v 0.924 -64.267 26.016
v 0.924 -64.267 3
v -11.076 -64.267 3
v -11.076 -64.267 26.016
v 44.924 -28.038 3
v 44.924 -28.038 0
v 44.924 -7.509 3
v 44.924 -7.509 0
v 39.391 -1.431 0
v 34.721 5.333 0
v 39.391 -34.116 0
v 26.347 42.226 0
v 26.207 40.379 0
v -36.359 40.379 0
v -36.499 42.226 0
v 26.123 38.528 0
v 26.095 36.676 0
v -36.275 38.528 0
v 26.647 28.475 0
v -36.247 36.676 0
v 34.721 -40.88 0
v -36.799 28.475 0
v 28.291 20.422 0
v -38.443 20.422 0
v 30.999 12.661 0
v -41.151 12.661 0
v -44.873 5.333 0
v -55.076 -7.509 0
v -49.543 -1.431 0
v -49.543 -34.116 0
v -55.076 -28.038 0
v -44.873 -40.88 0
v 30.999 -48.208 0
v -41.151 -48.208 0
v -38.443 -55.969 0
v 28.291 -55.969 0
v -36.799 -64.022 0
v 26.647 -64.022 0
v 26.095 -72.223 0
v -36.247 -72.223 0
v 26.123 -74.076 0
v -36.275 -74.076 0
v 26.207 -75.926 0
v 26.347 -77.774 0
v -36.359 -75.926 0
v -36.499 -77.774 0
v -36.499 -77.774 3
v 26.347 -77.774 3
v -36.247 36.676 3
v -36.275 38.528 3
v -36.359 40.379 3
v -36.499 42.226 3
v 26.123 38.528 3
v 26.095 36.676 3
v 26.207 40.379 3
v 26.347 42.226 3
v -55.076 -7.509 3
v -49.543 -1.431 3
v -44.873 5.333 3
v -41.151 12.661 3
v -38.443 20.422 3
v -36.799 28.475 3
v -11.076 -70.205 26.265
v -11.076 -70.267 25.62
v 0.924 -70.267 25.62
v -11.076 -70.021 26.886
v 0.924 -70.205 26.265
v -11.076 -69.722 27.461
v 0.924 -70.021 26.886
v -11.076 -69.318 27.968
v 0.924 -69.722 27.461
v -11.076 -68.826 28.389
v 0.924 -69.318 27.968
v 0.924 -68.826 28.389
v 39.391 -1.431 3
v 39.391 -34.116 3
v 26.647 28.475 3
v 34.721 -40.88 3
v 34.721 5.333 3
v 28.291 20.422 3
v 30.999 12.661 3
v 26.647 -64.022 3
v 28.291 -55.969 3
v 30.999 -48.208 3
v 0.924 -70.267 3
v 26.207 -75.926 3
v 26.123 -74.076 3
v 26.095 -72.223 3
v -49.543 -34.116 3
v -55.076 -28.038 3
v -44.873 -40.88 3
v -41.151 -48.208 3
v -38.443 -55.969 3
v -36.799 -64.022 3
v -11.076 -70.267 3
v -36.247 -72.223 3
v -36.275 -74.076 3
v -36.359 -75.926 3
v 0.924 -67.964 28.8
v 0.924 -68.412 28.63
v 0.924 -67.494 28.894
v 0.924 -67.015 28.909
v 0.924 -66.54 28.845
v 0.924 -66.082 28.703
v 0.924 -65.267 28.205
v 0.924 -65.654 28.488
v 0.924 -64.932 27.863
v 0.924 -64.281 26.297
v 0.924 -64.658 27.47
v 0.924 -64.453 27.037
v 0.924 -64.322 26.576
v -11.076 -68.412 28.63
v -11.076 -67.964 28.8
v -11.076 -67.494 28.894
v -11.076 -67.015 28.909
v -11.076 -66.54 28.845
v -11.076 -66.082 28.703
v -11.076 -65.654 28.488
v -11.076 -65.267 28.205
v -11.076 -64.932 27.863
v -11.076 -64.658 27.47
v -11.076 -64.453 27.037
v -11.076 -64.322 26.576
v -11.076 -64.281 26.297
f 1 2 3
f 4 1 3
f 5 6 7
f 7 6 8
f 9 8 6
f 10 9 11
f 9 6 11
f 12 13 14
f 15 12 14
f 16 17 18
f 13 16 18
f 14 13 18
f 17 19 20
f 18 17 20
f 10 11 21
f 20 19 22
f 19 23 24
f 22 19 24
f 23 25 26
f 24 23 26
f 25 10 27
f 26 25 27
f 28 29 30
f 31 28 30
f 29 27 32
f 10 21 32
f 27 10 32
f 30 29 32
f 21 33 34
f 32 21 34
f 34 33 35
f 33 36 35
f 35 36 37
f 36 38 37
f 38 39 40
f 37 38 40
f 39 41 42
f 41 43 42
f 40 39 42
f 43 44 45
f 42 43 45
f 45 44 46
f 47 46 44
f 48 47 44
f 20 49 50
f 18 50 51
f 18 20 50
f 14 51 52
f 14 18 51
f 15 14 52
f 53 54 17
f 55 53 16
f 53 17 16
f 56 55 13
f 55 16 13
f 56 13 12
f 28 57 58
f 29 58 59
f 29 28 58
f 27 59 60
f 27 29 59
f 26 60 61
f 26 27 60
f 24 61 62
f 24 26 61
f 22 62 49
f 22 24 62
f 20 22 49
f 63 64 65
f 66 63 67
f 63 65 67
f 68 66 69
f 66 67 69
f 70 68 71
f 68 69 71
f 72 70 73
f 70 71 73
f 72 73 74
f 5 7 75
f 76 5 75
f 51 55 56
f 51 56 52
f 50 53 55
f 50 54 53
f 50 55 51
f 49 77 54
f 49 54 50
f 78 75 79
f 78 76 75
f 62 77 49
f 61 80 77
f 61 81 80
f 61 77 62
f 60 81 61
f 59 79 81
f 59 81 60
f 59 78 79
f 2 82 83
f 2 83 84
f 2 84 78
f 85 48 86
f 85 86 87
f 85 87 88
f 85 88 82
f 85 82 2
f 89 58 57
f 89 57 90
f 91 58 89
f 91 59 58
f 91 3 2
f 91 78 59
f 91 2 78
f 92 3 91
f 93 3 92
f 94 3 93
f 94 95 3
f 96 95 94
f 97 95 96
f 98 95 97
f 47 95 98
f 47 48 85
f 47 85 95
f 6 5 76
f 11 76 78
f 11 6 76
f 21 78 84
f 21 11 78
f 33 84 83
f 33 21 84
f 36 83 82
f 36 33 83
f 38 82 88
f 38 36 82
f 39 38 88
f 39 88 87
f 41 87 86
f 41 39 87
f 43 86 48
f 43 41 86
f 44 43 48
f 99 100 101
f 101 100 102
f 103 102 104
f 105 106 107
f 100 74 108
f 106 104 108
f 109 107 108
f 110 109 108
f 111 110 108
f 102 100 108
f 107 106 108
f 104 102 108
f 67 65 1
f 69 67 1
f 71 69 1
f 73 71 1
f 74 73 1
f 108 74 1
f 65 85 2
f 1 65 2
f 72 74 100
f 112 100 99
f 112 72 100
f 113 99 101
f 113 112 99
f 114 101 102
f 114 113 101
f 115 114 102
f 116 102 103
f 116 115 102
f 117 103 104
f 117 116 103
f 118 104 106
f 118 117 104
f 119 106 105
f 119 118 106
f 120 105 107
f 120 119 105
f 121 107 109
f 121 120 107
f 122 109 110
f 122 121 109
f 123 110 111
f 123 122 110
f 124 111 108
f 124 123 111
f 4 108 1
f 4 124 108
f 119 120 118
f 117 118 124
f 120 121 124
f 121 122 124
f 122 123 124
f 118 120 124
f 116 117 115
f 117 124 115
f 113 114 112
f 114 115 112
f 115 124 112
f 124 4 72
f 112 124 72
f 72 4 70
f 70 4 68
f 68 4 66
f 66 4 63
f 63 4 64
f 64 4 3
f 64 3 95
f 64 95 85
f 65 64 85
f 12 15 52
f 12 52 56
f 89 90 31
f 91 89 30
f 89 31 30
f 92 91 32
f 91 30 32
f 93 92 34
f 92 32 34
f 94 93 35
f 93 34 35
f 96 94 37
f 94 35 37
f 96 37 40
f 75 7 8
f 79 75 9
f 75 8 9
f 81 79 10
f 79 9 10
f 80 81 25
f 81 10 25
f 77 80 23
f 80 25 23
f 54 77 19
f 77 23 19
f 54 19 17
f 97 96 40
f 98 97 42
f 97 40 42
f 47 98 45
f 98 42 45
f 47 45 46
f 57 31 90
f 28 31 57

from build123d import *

# Parameters (mm, degrees)
F1_DEPTH = 3
F2_DEPTH = 57
F6_DEPTH = 26
F7_R     = 3.379899
F8_R     = 2.897056


with BuildPart() as f1:
    # F0 (on Top) → F1 (new body)
    with BuildSketch(Plane.XY):
        with BuildLine():
            Line((-55.075931, -7.509255), (-55.075931, 42.226299))
            Line((-55.075931, 42.226299), (-36.499178, 42.226299))
            ThreePointArc((-36.499178, 42.226299), (-154.89147, 58.109982), (-55.075931, -7.509255))
        make_face()
        with BuildLine():
            Line((-36.499178, 42.226299), (-55.075931, 42.226299))
            Line((-55.075931, 42.226299), (-55.075931, -7.509255))
            ThreePointArc((-55.075931, -7.509255), (-41.150625, 12.660964), (-36.247192, 36.675714))
            ThreePointArc((-36.247192, 36.675714), (-36.310221, 39.453865), (-36.499178, 42.226299))
        make_face()
        with BuildLine():
            Line((-5.075931, 42.226299), (-36.499178, 42.226299))
            ThreePointArc((-36.499178, 42.226299), (-36.310221, 39.453865), (-36.247192, 36.675714))
            ThreePointArc((-36.247192, 36.675714), (-41.150625, 12.660964), (-55.075931, -7.509255))
            Line((-55.075931, -7.509255), (-55.075931, -17.773701))
            Line((-55.075931, -17.773701), (-5.075931, -17.773701))
            Line((-5.075931, -17.773701), (-5.075931, 42.226299))
        make_face()
    extrude(amount=F1_DEPTH)

    # F0 (on Top) → F2 (cut)
    with BuildSketch(Plane.XY):
        with BuildLine():
            Line((-36.499178, 42.226299), (-55.075931, 42.226299))
            Line((-55.075931, 42.226299), (-55.075931, -7.509255))
            ThreePointArc((-55.075931, -7.509255), (-41.150625, 12.660964), (-36.247192, 36.675714))
            ThreePointArc((-36.247192, 36.675714), (-36.310221, 39.453865), (-36.499178, 42.226299))
        make_face()
        with BuildLine():
            Line((-55.075931, -7.509255), (-55.075931, 42.226299))
            Line((-55.075931, 42.226299), (-36.499178, 42.226299))
            ThreePointArc((-36.499178, 42.226299), (-154.89147, 58.109982), (-55.075931, -7.509255))
        make_face()
    extrude(amount=F2_DEPTH, mode=Mode.SUBTRACT)

    # F3: F1 across face


with BuildPart() as f1_1:
    add(f1.part)
    add(f1.part.mirror(Plane(origin=(-5.075931, 12.226299, 1.5), x_dir=(0, 1, 0), z_dir=(1, 0, 0))))

    # F4: F1 across face


with BuildPart() as f1_2:
    add(f1_1.part)
    add(f1_1.part.mirror(Plane(origin=(-5.075931, -17.773701, 1.5), x_dir=(1, 0, 0), z_dir=(0, -1, 0))))

    # F5 (on face) → F6 (join)
    with BuildSketch(Plane.XY.offset(3)):
        Polygon((-11.076178, -70.267022), (-5.076178, -70.267022), (0.923822, -70.267022), (0.923822, -64.267022), (-5.076178, -64.267022), (-11.076178, -64.267022), align=None)
    extrude(amount=F6_DEPTH)

    # F7
    f7_edges = [f1_2.edges().sort_by_distance(p)[0] for p in [
        (-5.076178, -70.267022, 29),
    ]]
    fillet(f7_edges, radius=F7_R)

    # F8
    f8_edges = [f1_2.edges().sort_by_distance(p)[0] for p in [
        (-5.076178, -64.267022, 29),
    ]]
    fillet(f8_edges, radius=F8_R)


solid = f1_2.part
